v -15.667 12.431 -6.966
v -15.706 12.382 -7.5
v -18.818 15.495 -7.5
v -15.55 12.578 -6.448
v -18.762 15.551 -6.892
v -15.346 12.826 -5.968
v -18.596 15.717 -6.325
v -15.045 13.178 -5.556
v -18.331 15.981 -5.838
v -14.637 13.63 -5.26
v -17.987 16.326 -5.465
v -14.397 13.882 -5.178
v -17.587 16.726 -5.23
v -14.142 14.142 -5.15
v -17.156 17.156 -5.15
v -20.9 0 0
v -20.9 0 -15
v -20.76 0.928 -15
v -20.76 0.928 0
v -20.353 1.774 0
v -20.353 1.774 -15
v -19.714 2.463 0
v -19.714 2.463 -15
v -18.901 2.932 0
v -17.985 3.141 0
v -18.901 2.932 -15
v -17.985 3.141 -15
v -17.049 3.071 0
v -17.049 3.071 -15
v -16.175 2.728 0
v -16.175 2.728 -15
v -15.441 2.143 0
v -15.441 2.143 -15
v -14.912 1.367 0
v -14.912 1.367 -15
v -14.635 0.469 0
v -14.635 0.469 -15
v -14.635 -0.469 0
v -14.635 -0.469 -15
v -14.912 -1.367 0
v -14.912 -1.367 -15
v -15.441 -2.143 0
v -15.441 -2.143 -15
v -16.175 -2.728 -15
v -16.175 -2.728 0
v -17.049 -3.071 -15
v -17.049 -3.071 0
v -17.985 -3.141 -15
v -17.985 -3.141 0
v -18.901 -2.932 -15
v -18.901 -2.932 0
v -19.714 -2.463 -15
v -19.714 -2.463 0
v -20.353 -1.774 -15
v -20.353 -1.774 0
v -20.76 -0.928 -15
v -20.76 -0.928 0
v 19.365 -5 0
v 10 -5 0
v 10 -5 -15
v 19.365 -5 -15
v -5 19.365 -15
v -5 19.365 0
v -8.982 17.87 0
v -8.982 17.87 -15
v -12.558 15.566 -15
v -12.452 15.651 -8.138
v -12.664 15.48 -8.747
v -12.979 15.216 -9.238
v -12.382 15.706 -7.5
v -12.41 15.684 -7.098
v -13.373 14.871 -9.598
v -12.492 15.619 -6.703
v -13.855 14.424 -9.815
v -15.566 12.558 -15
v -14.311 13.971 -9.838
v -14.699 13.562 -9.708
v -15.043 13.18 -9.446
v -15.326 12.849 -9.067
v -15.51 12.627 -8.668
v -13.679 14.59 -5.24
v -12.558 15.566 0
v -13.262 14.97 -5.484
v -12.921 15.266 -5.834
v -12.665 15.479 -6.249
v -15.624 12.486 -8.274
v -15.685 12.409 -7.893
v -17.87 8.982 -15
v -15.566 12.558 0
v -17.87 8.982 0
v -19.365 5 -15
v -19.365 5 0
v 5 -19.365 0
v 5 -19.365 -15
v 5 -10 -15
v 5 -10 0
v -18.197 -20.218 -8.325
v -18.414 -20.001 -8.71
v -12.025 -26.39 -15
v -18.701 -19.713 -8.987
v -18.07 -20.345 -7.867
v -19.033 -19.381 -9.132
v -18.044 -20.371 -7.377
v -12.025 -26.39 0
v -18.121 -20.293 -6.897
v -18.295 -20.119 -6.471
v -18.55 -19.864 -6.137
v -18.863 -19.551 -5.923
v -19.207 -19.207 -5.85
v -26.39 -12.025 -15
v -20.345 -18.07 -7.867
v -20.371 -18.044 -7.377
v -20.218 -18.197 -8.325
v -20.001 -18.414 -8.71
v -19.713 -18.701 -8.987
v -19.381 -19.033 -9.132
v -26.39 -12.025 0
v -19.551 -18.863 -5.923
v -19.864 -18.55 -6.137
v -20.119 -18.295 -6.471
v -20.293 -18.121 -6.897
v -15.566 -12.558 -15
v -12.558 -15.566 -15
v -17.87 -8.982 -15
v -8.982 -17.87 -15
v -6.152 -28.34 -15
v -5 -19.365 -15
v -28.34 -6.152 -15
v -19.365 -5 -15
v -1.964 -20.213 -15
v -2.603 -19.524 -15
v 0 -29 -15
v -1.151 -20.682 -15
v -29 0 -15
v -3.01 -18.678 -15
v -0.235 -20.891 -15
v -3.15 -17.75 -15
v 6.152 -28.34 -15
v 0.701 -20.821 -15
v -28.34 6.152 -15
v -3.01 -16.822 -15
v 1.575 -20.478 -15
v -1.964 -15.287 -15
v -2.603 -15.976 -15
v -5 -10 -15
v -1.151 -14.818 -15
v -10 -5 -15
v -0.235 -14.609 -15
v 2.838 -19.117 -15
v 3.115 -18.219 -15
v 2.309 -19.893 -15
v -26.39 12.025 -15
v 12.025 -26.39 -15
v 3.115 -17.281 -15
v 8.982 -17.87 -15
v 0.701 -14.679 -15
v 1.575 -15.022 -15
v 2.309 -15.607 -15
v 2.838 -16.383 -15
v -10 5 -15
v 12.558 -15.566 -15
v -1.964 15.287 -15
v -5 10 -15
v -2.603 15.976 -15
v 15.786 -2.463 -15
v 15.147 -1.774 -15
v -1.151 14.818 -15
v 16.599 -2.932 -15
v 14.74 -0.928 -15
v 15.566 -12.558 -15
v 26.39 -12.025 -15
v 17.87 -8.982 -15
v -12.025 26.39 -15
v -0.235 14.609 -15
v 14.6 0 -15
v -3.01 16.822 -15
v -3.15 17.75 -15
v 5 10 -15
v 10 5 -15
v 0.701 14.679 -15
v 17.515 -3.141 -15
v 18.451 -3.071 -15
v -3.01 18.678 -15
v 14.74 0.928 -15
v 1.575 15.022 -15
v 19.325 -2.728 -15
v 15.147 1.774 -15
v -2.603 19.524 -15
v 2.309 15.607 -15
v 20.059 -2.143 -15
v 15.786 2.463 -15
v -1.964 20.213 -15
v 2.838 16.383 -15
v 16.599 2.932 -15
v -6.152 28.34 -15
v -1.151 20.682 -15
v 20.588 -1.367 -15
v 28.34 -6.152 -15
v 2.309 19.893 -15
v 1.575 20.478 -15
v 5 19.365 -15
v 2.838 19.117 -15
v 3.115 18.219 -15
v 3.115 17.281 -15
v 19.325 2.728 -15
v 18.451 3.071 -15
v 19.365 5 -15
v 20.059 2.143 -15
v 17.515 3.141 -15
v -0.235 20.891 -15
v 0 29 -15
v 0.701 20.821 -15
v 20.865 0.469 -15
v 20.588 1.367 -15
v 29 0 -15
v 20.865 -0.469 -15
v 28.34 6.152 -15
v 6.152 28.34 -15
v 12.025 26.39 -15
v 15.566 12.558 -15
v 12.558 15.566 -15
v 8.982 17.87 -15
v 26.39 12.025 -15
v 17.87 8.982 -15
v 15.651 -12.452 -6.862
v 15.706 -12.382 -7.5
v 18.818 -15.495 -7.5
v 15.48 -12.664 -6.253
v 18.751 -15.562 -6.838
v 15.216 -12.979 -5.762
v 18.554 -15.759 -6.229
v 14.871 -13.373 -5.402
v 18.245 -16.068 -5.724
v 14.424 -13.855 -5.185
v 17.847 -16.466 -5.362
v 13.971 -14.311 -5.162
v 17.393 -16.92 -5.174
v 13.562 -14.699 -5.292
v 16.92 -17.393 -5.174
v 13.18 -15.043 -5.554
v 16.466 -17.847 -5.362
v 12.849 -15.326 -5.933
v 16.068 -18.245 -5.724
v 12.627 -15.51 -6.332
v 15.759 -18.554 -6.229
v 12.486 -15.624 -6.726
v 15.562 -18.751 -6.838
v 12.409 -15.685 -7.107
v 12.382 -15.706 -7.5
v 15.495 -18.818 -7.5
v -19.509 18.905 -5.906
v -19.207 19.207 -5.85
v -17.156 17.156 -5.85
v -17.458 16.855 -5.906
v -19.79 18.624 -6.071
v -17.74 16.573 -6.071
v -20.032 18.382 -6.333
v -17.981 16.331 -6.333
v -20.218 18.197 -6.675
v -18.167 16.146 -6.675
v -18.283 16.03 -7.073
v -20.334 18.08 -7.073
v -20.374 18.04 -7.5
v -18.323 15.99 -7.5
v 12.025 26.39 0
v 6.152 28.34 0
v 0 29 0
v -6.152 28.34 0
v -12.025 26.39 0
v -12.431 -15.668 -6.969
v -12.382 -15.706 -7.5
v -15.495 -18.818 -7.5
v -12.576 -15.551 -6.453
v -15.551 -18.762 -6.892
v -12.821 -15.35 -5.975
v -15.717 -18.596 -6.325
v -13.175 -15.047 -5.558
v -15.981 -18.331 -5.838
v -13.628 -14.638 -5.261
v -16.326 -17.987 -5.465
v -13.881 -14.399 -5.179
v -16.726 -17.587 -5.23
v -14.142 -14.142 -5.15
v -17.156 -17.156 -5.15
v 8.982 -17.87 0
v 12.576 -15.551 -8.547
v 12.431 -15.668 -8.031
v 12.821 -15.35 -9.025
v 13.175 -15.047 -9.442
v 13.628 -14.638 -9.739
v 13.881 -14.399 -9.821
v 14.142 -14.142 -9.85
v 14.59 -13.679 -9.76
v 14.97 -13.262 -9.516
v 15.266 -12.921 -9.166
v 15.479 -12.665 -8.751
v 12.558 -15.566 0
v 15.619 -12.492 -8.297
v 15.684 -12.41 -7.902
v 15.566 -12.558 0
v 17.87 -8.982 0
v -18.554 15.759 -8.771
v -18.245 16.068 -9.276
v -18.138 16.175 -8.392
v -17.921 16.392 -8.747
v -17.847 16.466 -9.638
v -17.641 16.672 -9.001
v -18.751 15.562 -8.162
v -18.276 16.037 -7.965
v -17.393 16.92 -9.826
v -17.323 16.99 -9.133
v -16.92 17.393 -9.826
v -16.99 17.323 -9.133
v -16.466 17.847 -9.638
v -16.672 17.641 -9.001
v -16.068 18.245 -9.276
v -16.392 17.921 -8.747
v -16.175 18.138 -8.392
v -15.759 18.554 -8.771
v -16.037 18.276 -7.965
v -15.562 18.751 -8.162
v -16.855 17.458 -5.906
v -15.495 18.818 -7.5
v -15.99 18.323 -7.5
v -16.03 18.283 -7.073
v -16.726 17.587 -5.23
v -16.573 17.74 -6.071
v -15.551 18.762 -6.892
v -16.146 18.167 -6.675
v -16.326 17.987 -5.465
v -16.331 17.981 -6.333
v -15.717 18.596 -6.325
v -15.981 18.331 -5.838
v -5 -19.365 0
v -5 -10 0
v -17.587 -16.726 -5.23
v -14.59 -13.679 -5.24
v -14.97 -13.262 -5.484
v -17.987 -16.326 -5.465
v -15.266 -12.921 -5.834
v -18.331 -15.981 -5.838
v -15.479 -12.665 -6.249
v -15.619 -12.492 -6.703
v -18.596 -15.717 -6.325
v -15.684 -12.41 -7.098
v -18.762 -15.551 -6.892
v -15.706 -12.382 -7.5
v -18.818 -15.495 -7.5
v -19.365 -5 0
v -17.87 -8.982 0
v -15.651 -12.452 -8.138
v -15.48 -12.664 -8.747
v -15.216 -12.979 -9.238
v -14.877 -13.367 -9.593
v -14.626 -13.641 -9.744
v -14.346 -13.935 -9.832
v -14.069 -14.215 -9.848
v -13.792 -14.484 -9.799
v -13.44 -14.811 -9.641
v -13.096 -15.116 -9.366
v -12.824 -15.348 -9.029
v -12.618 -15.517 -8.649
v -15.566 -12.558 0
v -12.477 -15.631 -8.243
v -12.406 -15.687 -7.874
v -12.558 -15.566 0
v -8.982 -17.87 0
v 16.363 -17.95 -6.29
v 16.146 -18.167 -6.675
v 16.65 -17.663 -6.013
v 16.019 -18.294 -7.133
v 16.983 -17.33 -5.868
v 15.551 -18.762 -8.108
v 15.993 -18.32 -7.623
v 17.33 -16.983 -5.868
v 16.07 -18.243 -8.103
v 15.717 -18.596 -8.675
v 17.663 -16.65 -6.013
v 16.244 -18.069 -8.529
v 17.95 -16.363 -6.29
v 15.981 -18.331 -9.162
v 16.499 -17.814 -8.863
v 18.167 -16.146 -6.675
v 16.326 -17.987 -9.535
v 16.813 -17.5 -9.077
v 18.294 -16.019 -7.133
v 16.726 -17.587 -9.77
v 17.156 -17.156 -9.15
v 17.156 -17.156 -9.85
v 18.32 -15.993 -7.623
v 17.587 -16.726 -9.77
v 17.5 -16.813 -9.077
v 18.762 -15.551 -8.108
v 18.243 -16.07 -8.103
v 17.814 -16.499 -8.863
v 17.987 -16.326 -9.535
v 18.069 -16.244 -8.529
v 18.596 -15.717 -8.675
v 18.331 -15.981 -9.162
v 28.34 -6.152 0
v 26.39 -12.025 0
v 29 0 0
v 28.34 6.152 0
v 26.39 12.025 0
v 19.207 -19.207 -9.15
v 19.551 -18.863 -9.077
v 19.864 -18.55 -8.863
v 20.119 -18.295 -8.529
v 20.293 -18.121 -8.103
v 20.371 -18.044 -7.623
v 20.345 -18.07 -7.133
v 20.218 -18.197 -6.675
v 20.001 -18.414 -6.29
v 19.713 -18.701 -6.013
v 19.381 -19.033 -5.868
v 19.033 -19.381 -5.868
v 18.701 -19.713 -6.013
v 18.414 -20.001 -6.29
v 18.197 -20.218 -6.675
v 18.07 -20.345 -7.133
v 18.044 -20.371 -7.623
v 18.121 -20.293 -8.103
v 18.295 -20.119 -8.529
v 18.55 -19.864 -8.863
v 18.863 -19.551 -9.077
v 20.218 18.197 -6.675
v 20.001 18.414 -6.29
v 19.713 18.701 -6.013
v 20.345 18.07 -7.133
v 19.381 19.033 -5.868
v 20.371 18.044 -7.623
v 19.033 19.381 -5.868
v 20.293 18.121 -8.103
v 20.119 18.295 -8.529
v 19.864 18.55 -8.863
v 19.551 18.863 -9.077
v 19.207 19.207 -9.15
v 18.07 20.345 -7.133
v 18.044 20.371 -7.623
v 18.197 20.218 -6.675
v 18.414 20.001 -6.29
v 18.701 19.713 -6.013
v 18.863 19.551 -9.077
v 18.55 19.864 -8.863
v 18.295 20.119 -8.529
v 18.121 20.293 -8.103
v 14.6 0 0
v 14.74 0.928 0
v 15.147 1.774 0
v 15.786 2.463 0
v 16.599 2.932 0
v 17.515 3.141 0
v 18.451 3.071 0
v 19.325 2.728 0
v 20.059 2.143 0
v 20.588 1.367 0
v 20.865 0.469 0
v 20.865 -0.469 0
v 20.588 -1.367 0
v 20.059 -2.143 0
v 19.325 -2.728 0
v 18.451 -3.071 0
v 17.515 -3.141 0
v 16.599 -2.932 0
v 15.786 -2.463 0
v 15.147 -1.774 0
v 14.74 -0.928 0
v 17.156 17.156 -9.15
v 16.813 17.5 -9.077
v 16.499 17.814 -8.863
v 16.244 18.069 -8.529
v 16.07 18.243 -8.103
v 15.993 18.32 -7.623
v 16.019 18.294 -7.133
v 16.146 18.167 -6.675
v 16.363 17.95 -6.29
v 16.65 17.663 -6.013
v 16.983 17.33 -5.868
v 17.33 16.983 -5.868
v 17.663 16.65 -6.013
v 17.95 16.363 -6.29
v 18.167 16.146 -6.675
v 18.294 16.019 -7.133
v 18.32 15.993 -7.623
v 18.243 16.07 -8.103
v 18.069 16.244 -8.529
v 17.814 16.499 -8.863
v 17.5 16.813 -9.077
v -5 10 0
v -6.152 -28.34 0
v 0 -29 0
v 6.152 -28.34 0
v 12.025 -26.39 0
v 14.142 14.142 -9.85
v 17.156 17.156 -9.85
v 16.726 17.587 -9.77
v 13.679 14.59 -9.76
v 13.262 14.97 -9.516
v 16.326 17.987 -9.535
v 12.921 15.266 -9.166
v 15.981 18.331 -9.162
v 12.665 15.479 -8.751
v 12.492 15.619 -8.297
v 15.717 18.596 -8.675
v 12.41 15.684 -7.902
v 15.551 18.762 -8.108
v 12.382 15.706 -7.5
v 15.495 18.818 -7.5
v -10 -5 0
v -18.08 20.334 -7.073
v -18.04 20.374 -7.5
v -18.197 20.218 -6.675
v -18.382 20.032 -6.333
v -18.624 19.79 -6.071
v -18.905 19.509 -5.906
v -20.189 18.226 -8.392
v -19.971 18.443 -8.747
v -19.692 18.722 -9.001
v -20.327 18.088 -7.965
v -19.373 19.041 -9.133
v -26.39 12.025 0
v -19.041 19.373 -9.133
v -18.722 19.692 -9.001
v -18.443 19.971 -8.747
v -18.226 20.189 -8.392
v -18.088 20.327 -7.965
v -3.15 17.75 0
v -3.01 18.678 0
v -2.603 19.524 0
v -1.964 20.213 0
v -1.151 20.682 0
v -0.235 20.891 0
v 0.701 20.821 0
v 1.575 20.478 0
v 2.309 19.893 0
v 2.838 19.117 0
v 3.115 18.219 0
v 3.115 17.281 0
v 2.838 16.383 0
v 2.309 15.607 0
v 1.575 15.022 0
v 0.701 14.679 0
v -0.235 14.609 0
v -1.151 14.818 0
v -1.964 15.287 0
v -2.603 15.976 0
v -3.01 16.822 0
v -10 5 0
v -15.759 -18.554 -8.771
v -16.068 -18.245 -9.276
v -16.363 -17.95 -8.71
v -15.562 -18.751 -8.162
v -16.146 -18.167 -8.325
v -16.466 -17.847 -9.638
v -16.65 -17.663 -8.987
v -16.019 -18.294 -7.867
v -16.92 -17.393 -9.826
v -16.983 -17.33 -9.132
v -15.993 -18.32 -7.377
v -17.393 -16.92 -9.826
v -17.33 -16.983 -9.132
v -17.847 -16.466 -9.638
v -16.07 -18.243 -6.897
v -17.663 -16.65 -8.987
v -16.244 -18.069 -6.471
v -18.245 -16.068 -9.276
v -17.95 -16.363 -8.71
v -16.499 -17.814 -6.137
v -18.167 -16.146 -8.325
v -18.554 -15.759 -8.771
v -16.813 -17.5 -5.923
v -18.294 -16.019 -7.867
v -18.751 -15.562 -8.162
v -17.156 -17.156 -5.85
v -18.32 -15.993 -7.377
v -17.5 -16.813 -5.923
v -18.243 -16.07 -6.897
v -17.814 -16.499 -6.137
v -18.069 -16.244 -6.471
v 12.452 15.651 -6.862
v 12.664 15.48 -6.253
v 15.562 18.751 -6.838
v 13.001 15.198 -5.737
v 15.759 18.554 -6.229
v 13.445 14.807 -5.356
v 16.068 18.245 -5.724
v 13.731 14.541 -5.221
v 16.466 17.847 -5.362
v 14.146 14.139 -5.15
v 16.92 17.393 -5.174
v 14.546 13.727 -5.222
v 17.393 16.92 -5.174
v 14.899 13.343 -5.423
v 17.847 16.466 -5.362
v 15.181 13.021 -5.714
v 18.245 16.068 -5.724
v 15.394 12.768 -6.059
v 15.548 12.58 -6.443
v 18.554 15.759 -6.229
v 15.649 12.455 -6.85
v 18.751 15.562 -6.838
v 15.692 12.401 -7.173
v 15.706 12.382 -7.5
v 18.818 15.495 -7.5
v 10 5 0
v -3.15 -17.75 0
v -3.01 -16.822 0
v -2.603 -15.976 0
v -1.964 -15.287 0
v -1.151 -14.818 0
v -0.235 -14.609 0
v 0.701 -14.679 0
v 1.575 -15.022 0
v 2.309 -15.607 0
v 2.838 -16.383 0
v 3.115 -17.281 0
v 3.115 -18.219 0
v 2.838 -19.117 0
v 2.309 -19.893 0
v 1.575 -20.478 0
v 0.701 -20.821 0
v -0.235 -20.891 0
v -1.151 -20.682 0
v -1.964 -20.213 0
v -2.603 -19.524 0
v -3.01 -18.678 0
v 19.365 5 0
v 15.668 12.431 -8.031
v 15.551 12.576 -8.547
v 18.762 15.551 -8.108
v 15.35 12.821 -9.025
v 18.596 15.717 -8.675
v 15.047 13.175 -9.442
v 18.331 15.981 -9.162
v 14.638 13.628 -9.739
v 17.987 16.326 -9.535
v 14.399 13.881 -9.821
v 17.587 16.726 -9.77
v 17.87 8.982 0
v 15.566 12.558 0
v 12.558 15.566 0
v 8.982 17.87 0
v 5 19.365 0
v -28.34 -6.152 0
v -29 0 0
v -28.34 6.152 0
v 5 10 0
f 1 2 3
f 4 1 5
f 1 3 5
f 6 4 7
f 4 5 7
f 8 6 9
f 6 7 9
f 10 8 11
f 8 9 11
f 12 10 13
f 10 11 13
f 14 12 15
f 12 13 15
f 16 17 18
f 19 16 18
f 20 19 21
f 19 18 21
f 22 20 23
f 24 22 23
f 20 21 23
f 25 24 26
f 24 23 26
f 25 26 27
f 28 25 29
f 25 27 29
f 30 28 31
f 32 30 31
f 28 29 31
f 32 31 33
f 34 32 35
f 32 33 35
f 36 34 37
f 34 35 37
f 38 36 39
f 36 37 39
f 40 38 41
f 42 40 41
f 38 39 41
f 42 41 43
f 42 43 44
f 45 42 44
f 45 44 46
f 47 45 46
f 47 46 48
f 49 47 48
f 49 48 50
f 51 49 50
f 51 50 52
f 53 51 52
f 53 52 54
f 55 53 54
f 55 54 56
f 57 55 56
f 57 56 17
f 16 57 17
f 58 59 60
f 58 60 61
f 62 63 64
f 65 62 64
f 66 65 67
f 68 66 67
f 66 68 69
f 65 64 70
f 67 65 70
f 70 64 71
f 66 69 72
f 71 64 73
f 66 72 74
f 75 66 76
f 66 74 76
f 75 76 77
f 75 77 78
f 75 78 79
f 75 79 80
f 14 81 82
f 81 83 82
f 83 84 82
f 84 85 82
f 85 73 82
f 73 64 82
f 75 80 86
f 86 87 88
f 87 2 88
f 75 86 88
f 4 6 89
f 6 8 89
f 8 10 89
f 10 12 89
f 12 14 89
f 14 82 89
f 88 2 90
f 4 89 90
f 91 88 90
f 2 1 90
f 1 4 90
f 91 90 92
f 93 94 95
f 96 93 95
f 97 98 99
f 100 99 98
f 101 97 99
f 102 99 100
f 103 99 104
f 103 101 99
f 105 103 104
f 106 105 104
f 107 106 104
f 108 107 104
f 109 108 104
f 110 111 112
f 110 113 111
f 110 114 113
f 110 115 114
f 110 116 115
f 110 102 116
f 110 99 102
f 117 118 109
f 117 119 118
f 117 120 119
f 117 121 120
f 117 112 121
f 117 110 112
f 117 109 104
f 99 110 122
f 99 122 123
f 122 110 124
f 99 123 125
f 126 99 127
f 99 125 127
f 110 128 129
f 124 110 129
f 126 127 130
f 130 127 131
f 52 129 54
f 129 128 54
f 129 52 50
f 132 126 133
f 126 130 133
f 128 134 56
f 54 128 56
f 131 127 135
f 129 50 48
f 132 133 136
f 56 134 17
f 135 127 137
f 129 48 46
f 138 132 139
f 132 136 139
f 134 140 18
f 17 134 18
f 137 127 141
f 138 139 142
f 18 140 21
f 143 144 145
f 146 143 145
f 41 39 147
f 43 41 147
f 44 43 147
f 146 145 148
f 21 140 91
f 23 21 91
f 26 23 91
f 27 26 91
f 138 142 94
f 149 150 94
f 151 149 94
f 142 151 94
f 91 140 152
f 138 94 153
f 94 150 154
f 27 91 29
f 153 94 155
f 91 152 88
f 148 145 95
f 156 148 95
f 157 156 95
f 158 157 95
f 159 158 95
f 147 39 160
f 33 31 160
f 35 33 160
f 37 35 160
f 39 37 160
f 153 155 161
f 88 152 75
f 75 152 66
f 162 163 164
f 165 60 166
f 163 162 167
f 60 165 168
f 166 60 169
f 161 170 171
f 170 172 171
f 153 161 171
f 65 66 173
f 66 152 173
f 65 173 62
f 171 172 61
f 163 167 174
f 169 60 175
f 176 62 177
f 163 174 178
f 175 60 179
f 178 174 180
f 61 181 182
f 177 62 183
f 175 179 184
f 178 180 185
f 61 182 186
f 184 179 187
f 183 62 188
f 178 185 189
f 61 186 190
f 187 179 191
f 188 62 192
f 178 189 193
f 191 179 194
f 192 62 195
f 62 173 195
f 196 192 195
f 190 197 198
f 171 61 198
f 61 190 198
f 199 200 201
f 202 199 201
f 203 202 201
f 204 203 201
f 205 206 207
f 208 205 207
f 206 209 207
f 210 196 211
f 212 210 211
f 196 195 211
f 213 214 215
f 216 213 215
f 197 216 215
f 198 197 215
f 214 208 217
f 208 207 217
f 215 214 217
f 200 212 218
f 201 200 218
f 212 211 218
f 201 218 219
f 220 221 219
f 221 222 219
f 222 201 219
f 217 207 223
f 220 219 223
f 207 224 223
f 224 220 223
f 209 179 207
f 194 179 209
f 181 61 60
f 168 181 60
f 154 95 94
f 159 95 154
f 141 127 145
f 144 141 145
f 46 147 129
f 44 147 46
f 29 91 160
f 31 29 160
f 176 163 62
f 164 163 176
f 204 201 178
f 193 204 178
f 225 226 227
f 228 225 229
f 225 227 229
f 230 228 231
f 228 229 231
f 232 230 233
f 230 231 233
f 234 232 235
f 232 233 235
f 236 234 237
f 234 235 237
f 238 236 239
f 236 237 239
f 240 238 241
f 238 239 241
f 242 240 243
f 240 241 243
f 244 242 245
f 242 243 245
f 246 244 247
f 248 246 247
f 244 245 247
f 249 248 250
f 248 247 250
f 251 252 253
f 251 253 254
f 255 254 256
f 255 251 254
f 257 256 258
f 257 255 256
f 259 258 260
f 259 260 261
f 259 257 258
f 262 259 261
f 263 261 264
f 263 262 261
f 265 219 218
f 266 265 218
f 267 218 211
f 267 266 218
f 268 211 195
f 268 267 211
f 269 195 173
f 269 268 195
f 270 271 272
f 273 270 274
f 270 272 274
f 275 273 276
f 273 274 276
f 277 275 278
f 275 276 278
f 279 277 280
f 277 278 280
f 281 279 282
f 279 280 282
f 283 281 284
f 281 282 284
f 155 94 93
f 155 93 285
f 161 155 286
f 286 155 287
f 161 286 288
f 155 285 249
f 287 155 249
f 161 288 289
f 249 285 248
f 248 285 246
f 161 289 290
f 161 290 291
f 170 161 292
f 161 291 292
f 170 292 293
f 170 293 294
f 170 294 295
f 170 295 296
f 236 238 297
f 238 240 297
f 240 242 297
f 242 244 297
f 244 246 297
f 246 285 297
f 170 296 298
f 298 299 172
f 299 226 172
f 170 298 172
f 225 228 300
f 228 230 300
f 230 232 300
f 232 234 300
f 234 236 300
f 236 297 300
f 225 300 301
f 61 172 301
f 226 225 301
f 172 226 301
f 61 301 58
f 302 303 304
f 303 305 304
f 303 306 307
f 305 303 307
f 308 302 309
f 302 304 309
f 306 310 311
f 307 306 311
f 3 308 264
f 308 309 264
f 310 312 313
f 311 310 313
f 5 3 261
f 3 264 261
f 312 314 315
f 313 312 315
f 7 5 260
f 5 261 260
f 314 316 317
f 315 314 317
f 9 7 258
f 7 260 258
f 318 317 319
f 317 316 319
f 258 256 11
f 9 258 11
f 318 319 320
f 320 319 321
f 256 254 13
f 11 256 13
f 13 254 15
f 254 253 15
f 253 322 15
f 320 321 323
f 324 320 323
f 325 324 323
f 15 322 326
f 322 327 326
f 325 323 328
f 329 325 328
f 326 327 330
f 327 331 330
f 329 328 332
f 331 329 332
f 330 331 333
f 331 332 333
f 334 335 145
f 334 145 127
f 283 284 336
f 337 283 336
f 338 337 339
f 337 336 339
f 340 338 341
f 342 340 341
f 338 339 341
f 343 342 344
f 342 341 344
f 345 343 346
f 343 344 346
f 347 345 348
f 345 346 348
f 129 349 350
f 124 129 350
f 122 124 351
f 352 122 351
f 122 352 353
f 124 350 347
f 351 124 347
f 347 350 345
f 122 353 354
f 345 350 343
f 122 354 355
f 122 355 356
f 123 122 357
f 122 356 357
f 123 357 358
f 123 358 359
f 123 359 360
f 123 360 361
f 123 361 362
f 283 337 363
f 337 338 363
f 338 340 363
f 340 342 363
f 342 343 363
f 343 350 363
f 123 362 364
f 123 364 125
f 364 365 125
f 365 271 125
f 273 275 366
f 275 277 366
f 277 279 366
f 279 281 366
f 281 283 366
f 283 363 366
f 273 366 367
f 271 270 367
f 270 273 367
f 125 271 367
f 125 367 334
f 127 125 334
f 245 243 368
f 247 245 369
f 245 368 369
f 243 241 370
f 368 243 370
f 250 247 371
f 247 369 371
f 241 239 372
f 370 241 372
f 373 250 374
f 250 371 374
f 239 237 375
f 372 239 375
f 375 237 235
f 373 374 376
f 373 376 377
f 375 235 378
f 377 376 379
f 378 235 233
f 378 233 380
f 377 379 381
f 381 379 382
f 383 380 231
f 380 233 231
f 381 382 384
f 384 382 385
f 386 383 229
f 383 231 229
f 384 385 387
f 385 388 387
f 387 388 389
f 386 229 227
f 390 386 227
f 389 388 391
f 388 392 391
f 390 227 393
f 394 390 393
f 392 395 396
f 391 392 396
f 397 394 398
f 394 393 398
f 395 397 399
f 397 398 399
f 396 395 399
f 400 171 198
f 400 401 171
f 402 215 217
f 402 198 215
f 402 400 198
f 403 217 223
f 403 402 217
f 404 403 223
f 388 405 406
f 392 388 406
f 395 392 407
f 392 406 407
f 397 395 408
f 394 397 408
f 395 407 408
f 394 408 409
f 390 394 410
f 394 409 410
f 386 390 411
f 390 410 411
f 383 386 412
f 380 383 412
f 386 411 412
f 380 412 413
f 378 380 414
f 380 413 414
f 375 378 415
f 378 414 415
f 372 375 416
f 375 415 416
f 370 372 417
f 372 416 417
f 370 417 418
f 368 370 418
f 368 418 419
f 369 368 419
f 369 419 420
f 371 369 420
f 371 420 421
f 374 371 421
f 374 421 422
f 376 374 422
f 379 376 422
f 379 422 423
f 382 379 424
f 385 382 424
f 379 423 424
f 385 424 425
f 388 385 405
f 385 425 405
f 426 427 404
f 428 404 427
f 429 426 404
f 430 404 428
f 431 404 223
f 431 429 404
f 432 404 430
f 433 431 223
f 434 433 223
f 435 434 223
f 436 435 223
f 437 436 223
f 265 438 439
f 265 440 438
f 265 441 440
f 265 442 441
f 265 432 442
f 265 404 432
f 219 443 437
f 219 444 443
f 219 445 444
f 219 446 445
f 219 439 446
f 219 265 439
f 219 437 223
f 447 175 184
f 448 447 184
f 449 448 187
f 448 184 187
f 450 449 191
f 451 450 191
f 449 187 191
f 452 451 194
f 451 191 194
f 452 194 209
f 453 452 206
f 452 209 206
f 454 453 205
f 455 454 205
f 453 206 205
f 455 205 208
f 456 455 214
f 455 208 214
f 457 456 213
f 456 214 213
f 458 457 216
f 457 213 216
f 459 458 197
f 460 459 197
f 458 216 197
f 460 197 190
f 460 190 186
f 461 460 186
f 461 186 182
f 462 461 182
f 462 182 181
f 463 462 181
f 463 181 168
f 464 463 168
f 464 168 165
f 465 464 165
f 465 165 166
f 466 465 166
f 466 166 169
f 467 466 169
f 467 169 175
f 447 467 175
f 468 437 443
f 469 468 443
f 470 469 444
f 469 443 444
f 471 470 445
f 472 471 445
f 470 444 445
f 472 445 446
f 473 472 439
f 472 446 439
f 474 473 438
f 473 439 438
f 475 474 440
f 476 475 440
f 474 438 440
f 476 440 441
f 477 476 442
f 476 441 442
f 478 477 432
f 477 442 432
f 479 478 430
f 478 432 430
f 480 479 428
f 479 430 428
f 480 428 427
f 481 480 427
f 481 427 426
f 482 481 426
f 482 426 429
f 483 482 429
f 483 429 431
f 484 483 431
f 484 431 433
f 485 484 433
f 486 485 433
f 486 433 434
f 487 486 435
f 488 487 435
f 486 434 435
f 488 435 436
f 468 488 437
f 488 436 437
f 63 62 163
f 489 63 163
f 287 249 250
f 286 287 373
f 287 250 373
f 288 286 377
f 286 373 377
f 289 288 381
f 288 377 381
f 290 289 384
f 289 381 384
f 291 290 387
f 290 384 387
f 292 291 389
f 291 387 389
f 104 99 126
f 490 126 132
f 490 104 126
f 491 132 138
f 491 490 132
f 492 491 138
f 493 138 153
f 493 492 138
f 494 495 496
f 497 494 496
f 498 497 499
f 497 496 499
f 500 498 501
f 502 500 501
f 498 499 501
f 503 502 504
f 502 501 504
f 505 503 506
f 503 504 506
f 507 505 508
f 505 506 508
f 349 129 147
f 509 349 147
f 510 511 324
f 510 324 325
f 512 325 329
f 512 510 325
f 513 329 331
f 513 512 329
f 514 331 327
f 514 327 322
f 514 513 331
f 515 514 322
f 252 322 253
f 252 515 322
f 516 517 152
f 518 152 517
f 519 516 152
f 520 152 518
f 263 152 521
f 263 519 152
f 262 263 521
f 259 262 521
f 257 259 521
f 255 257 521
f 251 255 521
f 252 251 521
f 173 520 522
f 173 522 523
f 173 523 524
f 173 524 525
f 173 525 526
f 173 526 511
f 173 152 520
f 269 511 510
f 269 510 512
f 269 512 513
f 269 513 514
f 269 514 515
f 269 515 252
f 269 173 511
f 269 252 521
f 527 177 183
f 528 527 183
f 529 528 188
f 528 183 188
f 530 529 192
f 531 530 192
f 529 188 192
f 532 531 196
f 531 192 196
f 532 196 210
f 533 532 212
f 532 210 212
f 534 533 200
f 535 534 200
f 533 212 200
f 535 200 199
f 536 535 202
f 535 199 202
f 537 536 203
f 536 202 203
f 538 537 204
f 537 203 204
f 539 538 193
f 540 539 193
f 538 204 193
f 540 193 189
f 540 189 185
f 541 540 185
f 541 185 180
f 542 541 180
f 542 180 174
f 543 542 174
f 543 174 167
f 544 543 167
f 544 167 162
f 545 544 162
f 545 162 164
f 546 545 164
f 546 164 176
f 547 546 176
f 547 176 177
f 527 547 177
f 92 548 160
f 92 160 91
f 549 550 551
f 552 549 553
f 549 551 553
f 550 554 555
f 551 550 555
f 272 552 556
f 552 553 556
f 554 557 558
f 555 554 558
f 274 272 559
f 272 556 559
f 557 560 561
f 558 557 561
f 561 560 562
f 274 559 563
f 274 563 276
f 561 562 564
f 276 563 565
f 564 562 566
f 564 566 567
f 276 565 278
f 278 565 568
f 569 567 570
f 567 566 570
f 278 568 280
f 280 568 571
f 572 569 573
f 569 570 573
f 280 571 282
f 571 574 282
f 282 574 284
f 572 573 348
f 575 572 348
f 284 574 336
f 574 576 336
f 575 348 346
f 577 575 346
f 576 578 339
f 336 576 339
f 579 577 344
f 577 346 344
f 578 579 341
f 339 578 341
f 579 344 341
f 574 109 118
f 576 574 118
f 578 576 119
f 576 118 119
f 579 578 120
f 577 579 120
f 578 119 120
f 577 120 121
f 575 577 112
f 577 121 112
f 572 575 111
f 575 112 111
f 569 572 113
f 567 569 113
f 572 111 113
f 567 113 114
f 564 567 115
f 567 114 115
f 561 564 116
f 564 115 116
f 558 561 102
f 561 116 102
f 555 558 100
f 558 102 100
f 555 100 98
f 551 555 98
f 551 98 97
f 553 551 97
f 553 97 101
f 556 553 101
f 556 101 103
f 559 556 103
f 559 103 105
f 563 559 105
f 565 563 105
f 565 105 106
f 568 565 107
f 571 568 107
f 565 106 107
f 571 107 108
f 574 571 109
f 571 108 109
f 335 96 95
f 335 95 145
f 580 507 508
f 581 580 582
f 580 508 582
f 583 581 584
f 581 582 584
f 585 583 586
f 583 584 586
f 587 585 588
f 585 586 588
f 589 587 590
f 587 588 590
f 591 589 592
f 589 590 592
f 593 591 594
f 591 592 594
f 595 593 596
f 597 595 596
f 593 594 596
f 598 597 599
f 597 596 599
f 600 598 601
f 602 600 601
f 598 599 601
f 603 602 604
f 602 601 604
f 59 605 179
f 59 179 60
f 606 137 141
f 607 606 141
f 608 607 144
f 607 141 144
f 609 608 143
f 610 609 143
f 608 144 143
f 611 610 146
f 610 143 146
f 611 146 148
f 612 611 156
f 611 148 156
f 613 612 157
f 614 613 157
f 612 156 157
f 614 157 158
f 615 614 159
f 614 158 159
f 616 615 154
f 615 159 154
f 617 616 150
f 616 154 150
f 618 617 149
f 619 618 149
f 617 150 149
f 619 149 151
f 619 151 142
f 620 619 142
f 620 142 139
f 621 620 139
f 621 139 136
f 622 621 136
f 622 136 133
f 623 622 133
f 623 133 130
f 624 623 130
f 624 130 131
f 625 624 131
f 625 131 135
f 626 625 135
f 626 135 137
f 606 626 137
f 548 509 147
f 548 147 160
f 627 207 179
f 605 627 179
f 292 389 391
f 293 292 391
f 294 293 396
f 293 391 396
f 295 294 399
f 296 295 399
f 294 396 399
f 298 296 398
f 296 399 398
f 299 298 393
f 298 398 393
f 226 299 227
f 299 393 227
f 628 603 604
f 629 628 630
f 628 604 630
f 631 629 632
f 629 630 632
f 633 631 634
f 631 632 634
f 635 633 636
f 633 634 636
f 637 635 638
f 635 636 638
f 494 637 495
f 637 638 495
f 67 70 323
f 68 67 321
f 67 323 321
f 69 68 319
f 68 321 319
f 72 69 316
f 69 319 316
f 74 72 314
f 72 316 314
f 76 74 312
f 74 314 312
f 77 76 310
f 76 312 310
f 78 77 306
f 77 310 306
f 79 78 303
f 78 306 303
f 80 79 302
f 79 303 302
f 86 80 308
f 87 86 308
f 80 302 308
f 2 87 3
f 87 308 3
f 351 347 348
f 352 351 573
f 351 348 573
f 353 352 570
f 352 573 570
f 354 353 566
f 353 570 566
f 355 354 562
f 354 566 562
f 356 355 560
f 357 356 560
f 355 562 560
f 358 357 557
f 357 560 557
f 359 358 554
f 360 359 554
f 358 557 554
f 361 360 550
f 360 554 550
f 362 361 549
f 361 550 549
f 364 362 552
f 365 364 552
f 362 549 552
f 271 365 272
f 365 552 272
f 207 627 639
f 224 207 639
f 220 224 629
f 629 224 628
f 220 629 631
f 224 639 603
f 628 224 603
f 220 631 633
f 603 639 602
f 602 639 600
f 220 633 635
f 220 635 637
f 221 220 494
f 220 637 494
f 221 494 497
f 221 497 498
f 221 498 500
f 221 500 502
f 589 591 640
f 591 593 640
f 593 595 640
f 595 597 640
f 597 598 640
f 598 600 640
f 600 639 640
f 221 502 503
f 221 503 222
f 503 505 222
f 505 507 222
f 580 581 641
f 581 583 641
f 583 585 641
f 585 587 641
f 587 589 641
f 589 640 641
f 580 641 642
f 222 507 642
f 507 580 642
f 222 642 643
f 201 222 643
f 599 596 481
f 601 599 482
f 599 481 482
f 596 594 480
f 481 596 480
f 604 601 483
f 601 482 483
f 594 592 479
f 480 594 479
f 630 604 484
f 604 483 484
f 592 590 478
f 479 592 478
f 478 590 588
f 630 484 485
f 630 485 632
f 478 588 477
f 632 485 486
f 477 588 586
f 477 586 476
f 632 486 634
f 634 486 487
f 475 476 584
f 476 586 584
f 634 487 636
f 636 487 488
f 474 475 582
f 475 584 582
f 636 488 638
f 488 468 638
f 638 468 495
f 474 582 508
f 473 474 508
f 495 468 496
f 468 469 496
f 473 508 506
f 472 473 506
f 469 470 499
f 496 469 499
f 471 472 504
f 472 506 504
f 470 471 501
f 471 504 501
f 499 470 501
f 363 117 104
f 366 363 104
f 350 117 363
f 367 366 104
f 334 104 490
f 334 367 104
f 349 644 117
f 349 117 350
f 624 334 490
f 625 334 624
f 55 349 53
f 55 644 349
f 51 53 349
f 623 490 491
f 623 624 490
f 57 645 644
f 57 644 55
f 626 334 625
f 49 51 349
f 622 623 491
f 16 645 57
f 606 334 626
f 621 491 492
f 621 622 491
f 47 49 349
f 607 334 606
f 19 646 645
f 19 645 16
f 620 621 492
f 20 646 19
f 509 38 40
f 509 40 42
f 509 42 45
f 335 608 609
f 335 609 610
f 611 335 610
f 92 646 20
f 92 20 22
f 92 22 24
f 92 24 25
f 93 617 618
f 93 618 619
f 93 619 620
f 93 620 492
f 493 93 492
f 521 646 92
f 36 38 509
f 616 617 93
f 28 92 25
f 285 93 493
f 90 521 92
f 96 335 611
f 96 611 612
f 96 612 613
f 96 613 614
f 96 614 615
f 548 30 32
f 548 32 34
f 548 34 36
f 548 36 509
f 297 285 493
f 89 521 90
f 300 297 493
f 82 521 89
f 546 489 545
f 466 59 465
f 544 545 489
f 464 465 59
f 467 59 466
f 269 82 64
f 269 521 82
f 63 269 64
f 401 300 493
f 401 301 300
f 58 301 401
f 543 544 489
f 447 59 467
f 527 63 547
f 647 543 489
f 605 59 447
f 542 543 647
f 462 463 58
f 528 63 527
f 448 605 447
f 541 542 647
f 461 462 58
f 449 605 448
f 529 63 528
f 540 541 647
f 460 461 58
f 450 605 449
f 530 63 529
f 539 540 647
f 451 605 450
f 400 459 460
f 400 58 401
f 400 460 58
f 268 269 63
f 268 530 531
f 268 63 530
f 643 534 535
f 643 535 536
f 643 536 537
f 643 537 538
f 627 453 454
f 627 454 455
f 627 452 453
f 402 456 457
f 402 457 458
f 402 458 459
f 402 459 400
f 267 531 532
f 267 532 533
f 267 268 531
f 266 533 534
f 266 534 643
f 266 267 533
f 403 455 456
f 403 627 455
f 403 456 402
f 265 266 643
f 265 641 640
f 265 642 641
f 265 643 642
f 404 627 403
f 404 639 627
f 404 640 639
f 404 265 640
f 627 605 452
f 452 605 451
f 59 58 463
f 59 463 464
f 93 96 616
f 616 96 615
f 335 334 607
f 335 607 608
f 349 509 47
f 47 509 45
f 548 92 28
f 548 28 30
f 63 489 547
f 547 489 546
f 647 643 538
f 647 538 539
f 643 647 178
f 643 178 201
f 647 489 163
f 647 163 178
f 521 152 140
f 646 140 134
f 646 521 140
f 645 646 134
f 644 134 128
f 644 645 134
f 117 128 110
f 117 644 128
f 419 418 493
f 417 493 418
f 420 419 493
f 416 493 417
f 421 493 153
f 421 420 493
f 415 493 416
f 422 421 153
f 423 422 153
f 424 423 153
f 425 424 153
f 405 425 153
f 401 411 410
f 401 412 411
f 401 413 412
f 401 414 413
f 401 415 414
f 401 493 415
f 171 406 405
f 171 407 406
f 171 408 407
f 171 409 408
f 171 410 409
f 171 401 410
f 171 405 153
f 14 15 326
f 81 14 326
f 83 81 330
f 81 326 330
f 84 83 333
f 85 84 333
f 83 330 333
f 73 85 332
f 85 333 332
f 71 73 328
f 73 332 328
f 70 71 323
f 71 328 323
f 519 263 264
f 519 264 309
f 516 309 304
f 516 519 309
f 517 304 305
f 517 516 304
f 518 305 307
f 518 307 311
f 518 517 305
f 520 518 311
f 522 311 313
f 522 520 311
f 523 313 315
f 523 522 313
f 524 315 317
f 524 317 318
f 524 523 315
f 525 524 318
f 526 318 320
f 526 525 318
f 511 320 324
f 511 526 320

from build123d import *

# Parameters (mm, degrees)
SKETCH6_R                 = 29
SKETCH6_R_2               = 20
INNER_RING_DEPTH          = 15
MOTOR_CONNECTOR_CUT_DEPTH = 15
SKETCH10_R                = 3.15
CUT_EXTRUDE2_DEPTH        = 55
CUT_EXTRUDE2_DEPTH_BACK   = 70
CUT_EXTRUDE4_DEPTH        = 22
CUT_EXTRUDE6_DEPTH        = 7.9
CUT_EXTRUDE5_DEPTH        = 22
SKETCH15_R                = 2.35
SKETCH15_R_2              = 1.65
BOSS_EXTRUDE1_DEPTH       = 2.9
BOSS_EXTRUDE3_DEPTH       = 2.9
CUT_EXTRUDE8_DEPTH        = 9.9
CUT_EXTRUDE7_DEPTH        = 8.9
SKETCH21_R                = 2.35
SKETCH21_R_2              = 1.65
BOSS_EXTRUDE5_DEPTH       = 2.9
SKETCH19_R                = 2.35
SKETCH19_R_2              = 1.65
BOSS_EXTRUDE4_DEPTH       = 2.9


with BuildPart() as part:
    # Sketch6 → Inner Ring (new body)
    with BuildSketch(Plane.XY):
        Circle(SKETCH6_R)
        Circle(SKETCH6_R_2, mode=Mode.SUBTRACT)
    extrude(amount=-INNER_RING_DEPTH)

    # Sketch7 → Motor Connector Cut (add)
    with BuildSketch(Plane.XY):
        with BuildLine():
            ThreePointArc((20, 0), (19.840593925, 2.52008585), (19.364916731, 5))
            Line((19.364916731, 5), (9.999996731, 5))
            Line((9.999996731, 5), (9.999996731, -5))
            Line((9.999996731, -5), (19.364916731, -5))
            ThreePointArc((19.364916731, -5), (19.840593925, -2.52008585), (20, 0))
        make_face()
        with BuildLine():
            ThreePointArc((5, 19.364916731), (0, 20), (-5, 19.364916731))
            Line((-5, 19.364916731), (-5, 9.999996731))
            Line((-5, 9.999996731), (5, 9.999996731))
            Line((5, 9.999996731), (5, 19.364916731))
        make_face()
        with BuildLine():
            Line((-9.999996731, -5), (-9.999996731, 5))
            Line((-9.999996731, 5), (-19.364916731, 5))
            ThreePointArc((-19.364916731, 5), (-20, 0), (-19.364916731, -5))
            Line((-19.364916731, -5), (-9.999996731, -5))
        make_face()
        with BuildLine():
            Line((-5, -9.999996731), (-5, -19.364916731))
            ThreePointArc((-5, -19.364916731), (0, -20), (5, -19.364916731))
            Line((5, -19.364916731), (5, -9.999996731))
            Line((5, -9.999996731), (-5, -9.999996731))
        make_face()
    extrude(amount=-MOTOR_CONNECTOR_CUT_DEPTH)

    # Sketch10 → Cut-Extrude2 (cut, two sides)
    with BuildSketch(Plane(origin=(0, 0, -15), x_dir=(-1, 0, 0), z_dir=(0, 0, -1))) as cut_extrude2_sk:
        with Locations((-17.75, 0)):
            Circle(SKETCH10_R)
        with Locations((0, 17.75)):
            Circle(SKETCH10_R)
        with Locations((17.75, 0)):
            Circle(SKETCH10_R)
        with Locations((0, -17.75)):
            Circle(SKETCH10_R)
    extrude(amount=CUT_EXTRUDE2_DEPTH, mode=Mode.SUBTRACT)
    extrude(cut_extrude2_sk.sketch, amount=-CUT_EXTRUDE2_DEPTH_BACK, mode=Mode.SUBTRACT)

    # Sketch9 → Cut-Extrude4 (cut)
    with BuildSketch(Plane(origin=(0, 0, -15), x_dir=(-1, 0, 0), z_dir=(0, 0, -1))):
        with BuildLine():
            Line((-26.38954799, 12.024631259), (-12.024631259, 26.38954799))
            ThreePointArc((-12.024631259, 26.38954799), (-20.506096654, 20.506096654), (-26.38954799, 12.024631259))
        make_face()
        with BuildLine():
            ThreePointArc((26.38954799, 12.024631259), (20.506096654, 20.506096654), (12.024631259, 26.38954799))
            Line((12.024631259, 26.38954799), (26.38954799, 12.024631259))
        make_face()
        with BuildLine():
            Line((-12.024631259, -26.38954799), (-26.38954799, -12.024631259))
            ThreePointArc((-26.38954799, -12.024631259), (-20.506096654, -20.506096654), (-12.024631259, -26.38954799))
        make_face()
        with BuildLine():
            Line((26.38954799, -12.024631259), (12.024631259, -26.38954799))
            ThreePointArc((12.024631259, -26.38954799), (20.506096654, -20.506096654), (26.38954799, -12.024631259))
        make_face()
    extrude(amount=-CUT_EXTRUDE4_DEPTH, mode=Mode.SUBTRACT)

    # Sketch16 → Cut-Extrude6 (cut)
    with BuildSketch(Plane(origin=(-19.207089624, 19.207089624, 0), x_dir=(0, 0, 1), z_dir=(-0.707106781, 0.707106781, 0))):
        with BuildLine():
            ThreePointArc((-5.15, 0), (-5.838299064, 1.661700936), (-7.5, 2.35))
            Line((-7.5, 2.35), (-7.5, -2.35))
            ThreePointArc((-7.5, -2.35), (-5.838299064, -1.661700936), (-5.15, 0))
        make_face()
        with BuildLine():
            Line((-7.5, -2.35), (-7.5, 2.35))
            ThreePointArc((-7.5, 2.35), (-9.85, 0), (-7.5, -2.35))
        make_face()
    extrude(amount=-CUT_EXTRUDE6_DEPTH, mode=Mode.SUBTRACT)

    # Sketch14 → Cut-Extrude5 (cut)
    with BuildSketch(Plane(origin=(19.207089624, 19.207089624, 0), x_dir=(0, 0, -1), z_dir=(0.707106781, 0.707106781, 0))):
        with BuildLine():
            ThreePointArc((9.85, 0), (9.161700936, 1.661700936), (7.5, 2.35))
            Line((7.5, 2.35), (7.5, -2.35))
            ThreePointArc((7.5, -2.35), (9.161700936, -1.661700936), (9.85, 0))
        make_face()
        with BuildLine():
            Line((7.5, -2.35), (7.5, 2.35))
            ThreePointArc((7.5, 2.35), (5.15, 0), (7.5, -2.35))
        make_face()
    extrude(amount=-CUT_EXTRUDE5_DEPTH, mode=Mode.SUBTRACT)

    # Sketch15 → Boss-Extrude1 (add)
    with BuildSketch(Plane(origin=(19.207089624, 19.207089624, 0), x_dir=(0, 0, -1), z_dir=(0.707106781, 0.707106781, 0))):
        with Locations((7.5, 0)):
            Circle(SKETCH15_R)
        with Locations((7.5, 0)):
            Circle(SKETCH15_R_2, mode=Mode.SUBTRACT)
    extrude(amount=-BOSS_EXTRUDE1_DEPTH)

    # Sketch17 → Boss-Extrude3 (add)
    with BuildSketch(Plane(origin=(-19.207089624, 19.207089624, 0), x_dir=(0, 0, 1), z_dir=(-0.707106781, 0.707106781, 0))):
        with BuildLine():
            ThreePointArc((-5.15, 0), (-5.838299064, 1.661700936), (-7.5, 2.35))
            Line((-7.5, 2.35), (-7.5, 1.65))
            ThreePointArc((-7.5, 1.65), (-6.333273811, 1.166726189), (-5.85, 0))
            ThreePointArc((-5.85, 0), (-6.333273811, -1.166726189), (-7.5, -1.65))
            Line((-7.5, -1.65), (-7.5, -2.35))
            ThreePointArc((-7.5, -2.35), (-5.838299064, -1.661700936), (-5.15, 0))
        make_face()
        with BuildLine():
            Line((-7.5, 1.65), (-7.5, 2.35))
            ThreePointArc((-7.5, 2.35), (-9.85, 0), (-7.5, -2.35))
            Line((-7.5, -2.35), (-7.5, -1.65))
            ThreePointArc((-7.5, -1.65), (-9.15, 0), (-7.5, 1.65))
        make_face()
    extrude(amount=-BOSS_EXTRUDE3_DEPTH)

    # Sketch20 → Cut-Extrude8 (cut)
    with BuildSketch(Plane(origin=(-19.207089624, -19.207089624, 0), x_dir=(0, 0, 1), z_dir=(-0.707106781, -0.707106781, 0))):
        with BuildLine():
            ThreePointArc((-5.15, 0), (-5.838299064, 1.661700936), (-7.5, 2.35))
            Line((-7.5, 2.35), (-7.5, -2.35))
            ThreePointArc((-7.5, -2.35), (-5.838299064, -1.661700936), (-5.15, 0))
        make_face()
        with BuildLine():
            Line((-7.5, -2.35), (-7.5, 2.35))
            ThreePointArc((-7.5, 2.35), (-9.85, 0), (-7.5, -2.35))
        make_face()
    extrude(amount=-CUT_EXTRUDE8_DEPTH, mode=Mode.SUBTRACT)

    # Sketch18 → Cut-Extrude7 (cut)
    with BuildSketch(Plane(origin=(19.207089624, -19.207089624, 0), x_dir=(0, 0, -1), z_dir=(0.707106781, -0.707106781, 0))):
        with BuildLine():
            ThreePointArc((9.85, 0), (9.161700936, 1.661700936), (7.5, 2.35))
            Line((7.5, 2.35), (7.5, -2.35))
            ThreePointArc((7.5, -2.35), (9.161700936, -1.661700936), (9.85, 0))
        make_face()
        with BuildLine():
            Line((7.5, -2.35), (7.5, 2.35))
            ThreePointArc((7.5, 2.35), (5.15, 0), (7.5, -2.35))
        make_face()
    extrude(amount=-CUT_EXTRUDE7_DEPTH, mode=Mode.SUBTRACT)

    # Sketch21 → Boss-Extrude5 (add)
    with BuildSketch(Plane(origin=(-19.207089624, -19.207089624, 0), x_dir=(0, 0, 1), z_dir=(-0.707106781, -0.707106781, 0))):
        with Locations((-7.5, 0)):
            Circle(SKETCH21_R)
        with Locations((-7.5, 0)):
            Circle(SKETCH21_R_2, mode=Mode.SUBTRACT)
    extrude(amount=-BOSS_EXTRUDE5_DEPTH)

    # Sketch19 → Boss-Extrude4 (add)
    with BuildSketch(Plane(origin=(19.207089624, -19.207089624, 0), x_dir=(0, 0, -1), z_dir=(0.707106781, -0.707106781, 0))):
        with Locations((7.5, 0)):
            Circle(SKETCH19_R)
        with Locations((7.5, 0)):
            Circle(SKETCH19_R_2, mode=Mode.SUBTRACT)
    extrude(amount=-BOSS_EXTRUDE4_DEPTH)


solid = part.part
